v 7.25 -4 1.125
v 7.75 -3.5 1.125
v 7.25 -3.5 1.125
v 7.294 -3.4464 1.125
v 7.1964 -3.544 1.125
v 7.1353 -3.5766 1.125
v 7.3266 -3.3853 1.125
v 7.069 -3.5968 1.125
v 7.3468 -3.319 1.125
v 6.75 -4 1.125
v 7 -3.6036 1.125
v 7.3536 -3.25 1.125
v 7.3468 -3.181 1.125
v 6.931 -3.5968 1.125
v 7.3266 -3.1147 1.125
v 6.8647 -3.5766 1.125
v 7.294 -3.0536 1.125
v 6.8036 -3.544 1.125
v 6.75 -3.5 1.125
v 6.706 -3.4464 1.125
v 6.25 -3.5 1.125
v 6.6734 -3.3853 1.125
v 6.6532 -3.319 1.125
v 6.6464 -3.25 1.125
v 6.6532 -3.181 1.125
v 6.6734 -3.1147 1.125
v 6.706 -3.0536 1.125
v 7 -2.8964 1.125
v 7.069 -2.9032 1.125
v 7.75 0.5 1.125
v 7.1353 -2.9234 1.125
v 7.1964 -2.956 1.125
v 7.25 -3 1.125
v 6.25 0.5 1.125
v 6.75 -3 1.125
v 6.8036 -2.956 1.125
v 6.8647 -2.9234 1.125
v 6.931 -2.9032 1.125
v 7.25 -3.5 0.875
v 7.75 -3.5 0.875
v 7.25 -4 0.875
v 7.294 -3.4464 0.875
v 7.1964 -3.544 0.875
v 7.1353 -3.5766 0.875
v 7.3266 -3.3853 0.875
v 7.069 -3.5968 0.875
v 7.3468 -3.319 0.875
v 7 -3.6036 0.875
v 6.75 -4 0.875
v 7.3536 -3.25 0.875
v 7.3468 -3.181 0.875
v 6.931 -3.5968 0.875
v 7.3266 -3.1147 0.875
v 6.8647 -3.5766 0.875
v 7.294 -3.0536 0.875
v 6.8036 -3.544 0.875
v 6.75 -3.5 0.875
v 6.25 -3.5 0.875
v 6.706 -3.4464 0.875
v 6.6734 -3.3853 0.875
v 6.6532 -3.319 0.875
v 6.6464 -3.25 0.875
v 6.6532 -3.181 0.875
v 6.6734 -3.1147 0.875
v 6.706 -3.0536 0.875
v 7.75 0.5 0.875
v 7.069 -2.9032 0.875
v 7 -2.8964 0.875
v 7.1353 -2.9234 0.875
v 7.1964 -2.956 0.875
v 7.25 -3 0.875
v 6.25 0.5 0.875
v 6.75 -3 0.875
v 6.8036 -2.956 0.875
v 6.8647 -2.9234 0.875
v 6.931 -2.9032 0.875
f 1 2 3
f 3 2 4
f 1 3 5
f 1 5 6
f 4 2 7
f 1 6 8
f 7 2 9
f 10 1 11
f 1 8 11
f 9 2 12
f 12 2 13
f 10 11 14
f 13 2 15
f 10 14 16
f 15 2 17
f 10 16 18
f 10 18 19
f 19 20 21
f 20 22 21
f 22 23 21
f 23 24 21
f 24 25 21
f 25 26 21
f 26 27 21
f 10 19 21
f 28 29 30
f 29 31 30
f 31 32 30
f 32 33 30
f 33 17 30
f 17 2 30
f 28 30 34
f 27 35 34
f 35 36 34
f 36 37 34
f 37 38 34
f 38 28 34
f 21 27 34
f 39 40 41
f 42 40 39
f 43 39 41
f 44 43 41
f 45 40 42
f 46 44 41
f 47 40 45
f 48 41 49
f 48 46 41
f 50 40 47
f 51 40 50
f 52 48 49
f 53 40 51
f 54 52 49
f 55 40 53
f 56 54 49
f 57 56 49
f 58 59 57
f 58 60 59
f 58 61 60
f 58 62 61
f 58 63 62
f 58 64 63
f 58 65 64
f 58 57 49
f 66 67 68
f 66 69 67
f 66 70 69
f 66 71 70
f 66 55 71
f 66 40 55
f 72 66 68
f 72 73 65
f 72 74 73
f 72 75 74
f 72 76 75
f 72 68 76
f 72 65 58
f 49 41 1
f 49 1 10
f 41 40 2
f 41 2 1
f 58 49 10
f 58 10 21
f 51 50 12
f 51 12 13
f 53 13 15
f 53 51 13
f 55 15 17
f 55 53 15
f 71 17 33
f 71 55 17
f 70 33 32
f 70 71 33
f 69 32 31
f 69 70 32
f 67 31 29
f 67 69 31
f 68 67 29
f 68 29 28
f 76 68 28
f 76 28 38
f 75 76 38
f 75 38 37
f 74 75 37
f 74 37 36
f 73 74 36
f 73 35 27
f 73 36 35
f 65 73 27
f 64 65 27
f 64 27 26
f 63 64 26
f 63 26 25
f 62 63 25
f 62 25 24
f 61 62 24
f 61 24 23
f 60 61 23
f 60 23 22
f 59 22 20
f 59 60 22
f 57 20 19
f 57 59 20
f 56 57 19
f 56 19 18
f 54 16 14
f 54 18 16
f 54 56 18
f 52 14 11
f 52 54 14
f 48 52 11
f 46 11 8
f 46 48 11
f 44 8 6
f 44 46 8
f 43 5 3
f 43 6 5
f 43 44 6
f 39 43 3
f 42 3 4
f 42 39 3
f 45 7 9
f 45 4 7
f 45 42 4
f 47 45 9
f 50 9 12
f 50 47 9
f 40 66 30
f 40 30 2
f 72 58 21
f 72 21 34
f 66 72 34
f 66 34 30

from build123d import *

# Parameters (mm, degrees)
SKETCH016_R      = 0.353553
EXTRUDE015_DEPTH = 2
EXTRUDE014_DEPTH = 0.25


with BuildPart() as extrude015:
    # Sketch016 → Extrude015 (new body)
    with BuildSketch(Plane.XY):
        with Locations((7, -3.25)):
            Circle(SKETCH016_R)
    extrude(amount=EXTRUDE015_DEPTH)


with BuildPart() as cut007:
    # Sketch015 → Extrude014 (new body)
    with BuildSketch(Plane(origin=(0.25, 0, 1), x_dir=(1, 0, 0), z_dir=(0, 0, 1))):
        Polygon((7.5, 0.5), (7.5, -3.5), (7, -4), (6.5, -4), (6, -3.5), (6, 0.5), align=None)
    extrude(amount=EXTRUDE014_DEPTH)


with BuildPart() as cut007_1:
    # Extrude014 placement: moved
    add(cut007.part.moved(Location((0, 0, -0.125))))

    # Cut007: cut Extrude015
    add(extrude015.part, mode=Mode.SUBTRACT)


solid = cut007_1.part
